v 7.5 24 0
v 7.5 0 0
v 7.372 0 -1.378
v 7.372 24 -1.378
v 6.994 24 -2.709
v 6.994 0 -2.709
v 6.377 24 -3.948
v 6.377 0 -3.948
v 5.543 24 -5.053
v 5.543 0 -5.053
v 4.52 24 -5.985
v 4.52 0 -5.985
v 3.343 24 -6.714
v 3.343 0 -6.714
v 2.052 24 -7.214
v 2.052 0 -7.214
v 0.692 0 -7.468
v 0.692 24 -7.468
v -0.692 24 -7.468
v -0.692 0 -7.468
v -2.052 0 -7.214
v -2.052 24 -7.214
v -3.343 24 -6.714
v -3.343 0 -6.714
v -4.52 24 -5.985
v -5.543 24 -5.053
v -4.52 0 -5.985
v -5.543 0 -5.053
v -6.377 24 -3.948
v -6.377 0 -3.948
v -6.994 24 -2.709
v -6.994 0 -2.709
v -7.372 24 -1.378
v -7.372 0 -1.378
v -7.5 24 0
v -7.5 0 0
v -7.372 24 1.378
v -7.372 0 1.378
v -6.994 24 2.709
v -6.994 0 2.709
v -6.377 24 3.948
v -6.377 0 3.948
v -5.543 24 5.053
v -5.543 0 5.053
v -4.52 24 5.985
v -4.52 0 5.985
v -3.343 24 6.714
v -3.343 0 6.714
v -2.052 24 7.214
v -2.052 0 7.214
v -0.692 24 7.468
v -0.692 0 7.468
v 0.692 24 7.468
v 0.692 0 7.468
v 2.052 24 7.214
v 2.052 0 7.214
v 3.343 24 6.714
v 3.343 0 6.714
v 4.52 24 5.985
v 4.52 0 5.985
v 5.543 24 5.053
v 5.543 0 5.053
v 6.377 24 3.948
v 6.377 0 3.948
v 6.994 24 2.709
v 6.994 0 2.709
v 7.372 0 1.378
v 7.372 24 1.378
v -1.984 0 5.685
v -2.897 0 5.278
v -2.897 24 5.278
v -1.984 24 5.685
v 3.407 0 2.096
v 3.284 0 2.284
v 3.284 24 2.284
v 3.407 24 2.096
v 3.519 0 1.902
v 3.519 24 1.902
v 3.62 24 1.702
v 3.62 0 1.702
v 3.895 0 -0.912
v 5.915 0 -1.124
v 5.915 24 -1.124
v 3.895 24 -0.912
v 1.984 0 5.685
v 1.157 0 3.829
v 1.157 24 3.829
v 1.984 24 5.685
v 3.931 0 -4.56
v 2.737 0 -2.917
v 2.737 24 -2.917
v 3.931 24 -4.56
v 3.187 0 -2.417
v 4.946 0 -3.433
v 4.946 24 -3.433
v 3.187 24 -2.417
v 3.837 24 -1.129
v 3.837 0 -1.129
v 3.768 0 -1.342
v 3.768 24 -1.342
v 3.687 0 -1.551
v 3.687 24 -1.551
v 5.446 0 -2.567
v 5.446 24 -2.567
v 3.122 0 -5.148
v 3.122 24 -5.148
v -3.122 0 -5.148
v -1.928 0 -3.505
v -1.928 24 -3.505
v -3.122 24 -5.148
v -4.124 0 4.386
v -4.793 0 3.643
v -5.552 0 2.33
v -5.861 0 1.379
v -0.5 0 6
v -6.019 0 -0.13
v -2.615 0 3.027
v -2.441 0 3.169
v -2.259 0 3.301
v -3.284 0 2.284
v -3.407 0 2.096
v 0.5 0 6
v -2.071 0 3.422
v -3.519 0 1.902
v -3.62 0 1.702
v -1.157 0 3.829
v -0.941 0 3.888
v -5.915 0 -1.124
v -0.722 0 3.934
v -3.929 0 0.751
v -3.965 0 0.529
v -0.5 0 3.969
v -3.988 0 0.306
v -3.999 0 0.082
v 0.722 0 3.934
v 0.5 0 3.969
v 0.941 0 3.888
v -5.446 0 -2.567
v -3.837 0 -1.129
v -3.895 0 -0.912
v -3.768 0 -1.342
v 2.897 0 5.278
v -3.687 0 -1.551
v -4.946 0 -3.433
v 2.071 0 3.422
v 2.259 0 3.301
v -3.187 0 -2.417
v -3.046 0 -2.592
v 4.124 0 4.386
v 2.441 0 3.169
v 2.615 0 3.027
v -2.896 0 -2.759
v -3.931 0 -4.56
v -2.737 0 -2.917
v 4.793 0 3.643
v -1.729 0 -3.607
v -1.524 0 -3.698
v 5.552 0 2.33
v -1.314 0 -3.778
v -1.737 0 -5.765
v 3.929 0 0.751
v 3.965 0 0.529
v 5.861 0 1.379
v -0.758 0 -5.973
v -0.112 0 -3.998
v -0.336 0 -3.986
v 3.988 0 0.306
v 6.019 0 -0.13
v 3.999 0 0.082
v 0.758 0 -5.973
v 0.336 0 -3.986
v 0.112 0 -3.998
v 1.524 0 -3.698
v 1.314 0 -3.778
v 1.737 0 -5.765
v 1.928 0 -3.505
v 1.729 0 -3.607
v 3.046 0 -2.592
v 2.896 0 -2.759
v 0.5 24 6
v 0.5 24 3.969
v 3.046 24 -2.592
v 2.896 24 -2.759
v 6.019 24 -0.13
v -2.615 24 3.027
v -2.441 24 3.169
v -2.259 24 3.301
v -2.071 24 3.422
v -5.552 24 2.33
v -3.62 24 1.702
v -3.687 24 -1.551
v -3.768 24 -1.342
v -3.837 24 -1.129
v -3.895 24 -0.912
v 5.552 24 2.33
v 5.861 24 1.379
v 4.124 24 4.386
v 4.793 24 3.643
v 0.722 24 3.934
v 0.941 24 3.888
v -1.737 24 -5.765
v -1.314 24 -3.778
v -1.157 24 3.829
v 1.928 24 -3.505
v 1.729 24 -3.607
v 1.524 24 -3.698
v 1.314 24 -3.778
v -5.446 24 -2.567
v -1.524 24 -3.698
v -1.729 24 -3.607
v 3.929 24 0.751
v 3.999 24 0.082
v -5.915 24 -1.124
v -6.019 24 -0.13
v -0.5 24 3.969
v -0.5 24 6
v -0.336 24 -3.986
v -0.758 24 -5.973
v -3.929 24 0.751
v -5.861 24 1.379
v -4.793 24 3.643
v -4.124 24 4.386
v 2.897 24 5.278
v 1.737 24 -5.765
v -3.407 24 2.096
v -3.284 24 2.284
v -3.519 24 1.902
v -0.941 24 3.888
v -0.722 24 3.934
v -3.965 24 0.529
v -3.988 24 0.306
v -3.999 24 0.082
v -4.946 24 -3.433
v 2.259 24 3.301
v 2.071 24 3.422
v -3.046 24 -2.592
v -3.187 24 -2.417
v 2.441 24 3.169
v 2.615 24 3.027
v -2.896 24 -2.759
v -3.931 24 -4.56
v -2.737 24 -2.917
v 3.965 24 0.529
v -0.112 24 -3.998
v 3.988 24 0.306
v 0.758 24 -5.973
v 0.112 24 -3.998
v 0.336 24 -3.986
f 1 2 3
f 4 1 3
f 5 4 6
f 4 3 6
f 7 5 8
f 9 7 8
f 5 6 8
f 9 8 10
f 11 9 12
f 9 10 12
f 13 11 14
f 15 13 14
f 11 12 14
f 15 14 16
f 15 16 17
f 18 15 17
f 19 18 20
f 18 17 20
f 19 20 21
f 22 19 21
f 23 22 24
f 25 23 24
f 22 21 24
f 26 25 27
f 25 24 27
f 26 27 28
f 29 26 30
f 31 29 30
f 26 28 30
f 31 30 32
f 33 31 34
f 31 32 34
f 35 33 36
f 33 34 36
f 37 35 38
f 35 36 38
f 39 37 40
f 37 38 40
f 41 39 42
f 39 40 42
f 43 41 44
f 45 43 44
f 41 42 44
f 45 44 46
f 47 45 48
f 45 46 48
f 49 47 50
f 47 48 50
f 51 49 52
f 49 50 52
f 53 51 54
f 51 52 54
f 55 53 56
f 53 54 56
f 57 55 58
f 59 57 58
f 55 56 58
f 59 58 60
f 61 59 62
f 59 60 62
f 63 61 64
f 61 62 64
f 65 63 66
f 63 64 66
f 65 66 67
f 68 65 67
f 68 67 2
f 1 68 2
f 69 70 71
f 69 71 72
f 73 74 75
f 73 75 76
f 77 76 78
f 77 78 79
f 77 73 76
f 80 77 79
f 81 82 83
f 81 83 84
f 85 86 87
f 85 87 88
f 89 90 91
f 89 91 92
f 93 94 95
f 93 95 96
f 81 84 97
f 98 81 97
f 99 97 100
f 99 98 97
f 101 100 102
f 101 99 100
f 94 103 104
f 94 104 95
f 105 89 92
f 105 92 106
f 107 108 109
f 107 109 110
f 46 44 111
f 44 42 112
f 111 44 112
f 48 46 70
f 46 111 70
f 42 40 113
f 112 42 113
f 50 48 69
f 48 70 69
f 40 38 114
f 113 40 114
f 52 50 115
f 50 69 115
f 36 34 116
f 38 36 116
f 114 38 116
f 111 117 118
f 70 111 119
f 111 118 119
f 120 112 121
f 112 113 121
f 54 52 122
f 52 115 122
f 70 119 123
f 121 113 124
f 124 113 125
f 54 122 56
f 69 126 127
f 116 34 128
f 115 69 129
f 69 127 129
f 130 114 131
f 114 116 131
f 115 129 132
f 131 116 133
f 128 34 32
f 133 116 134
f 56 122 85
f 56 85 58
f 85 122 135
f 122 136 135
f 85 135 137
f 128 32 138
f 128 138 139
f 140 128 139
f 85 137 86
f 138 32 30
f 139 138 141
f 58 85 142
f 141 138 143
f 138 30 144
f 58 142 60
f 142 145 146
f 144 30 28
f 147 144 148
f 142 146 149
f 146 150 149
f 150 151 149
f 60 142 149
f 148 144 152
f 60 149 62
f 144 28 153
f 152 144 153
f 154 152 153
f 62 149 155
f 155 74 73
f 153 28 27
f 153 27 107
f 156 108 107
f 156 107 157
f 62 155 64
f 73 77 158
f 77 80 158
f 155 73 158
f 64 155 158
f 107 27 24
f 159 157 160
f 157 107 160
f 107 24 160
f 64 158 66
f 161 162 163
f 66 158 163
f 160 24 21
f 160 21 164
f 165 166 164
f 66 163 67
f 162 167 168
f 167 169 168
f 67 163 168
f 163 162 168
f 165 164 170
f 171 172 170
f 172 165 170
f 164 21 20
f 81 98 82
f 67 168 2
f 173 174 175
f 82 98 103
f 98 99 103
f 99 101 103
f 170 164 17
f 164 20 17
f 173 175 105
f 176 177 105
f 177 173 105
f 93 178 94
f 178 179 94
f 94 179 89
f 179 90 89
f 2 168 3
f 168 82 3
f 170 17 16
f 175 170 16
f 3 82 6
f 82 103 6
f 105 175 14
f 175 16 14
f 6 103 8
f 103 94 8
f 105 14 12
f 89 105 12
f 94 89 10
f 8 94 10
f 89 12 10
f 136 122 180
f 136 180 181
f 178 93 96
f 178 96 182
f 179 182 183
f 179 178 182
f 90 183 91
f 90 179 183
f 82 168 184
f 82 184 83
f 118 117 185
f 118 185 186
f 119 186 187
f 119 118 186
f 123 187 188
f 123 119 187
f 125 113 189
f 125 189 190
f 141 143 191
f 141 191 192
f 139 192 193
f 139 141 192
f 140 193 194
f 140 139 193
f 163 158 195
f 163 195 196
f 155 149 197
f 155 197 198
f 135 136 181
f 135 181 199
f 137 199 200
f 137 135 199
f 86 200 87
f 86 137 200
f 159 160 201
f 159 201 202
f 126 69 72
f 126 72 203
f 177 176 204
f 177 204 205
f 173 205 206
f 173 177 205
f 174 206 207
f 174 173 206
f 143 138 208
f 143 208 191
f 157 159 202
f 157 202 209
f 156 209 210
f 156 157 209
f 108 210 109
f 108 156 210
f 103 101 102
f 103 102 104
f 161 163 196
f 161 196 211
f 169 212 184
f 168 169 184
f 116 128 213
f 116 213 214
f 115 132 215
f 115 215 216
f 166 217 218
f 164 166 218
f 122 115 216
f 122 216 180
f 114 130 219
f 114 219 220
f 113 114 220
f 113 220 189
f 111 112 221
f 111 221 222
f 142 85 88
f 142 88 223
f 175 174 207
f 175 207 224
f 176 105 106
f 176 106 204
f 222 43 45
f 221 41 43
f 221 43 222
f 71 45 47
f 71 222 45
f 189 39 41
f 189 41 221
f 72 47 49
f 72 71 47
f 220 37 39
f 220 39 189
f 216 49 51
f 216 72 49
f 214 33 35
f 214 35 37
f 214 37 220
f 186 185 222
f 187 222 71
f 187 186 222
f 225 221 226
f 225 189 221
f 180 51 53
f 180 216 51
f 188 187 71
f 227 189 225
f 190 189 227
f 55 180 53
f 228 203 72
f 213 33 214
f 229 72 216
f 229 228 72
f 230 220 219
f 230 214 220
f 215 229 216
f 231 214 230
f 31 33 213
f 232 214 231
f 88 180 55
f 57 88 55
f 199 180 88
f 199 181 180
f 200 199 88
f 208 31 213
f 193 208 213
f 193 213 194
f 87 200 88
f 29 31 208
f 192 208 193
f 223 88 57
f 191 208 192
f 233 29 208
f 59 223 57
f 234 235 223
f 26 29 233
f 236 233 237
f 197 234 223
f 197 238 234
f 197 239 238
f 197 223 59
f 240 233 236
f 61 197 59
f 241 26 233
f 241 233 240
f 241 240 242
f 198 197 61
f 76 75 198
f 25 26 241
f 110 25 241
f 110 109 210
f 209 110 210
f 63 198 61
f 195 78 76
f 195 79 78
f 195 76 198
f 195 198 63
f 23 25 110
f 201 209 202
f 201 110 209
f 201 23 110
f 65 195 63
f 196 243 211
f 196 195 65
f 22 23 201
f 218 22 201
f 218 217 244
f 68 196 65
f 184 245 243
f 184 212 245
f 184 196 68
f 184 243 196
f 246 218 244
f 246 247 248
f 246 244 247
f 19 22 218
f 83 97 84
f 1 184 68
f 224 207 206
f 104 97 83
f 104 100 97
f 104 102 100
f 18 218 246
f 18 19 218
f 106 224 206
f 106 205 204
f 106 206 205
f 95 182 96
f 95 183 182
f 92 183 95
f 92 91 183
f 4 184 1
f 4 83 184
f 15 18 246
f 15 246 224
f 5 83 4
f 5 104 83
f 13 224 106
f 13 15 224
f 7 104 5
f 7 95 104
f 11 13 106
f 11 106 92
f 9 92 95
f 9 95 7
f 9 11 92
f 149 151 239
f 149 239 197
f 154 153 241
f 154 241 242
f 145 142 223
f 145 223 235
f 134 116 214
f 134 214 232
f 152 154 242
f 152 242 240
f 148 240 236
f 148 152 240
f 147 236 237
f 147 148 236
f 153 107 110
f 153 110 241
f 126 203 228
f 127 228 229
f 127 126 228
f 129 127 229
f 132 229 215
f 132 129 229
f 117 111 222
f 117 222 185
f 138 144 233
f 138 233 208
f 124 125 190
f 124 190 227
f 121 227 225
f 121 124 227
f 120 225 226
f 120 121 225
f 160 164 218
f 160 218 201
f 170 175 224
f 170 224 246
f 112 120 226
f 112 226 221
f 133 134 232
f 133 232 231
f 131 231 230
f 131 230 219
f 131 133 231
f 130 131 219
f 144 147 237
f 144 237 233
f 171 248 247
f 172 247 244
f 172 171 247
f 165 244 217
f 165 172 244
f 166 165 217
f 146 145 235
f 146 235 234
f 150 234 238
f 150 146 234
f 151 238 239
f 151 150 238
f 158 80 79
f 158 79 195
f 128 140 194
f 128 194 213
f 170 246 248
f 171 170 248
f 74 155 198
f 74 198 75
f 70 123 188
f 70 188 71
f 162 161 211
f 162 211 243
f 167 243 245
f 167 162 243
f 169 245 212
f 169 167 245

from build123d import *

# Parameters (mm, degrees)
SKETCH1_R           = 7.5
BOSS_EXTRUDE1_DEPTH = 24


with BuildPart() as part:
    # Sketch1 → Boss-Extrude1 (new body)
    with BuildSketch(Plane(origin=(0, 0, 0), x_dir=(1, 0, 0), z_dir=(0, 1, 0))):
        Circle(SKETCH1_R)
        with BuildLine():
            Line((-0.5, -3.968626967), (-0.5, -6))
            Line((-0.5, -6), (0.5, -6))
            Line((0.5, -6), (0.5, -3.968626967))
            ThreePointArc((0.5, -3.968626967), (0.831646763, -3.912590403), (1.157413281, -3.82888946))
            Line((1.157413281, -3.82888946), (1.98364713, -5.684641067))
            Line((1.98364713, -5.684641067), (2.897192587, -5.277904424))
            Line((2.897192587, -5.277904424), (2.070958739, -3.422152817))
            ThreePointArc((2.070958739, -3.422152817), (2.351141009, -3.236067977), (2.614699291, -3.027102181))
            Line((2.614699291, -3.027102181), (4.12430365, -4.386356051))
            Line((4.12430365, -4.386356051), (4.793434256, -3.643211225))
            Line((4.793434256, -3.643211225), (3.283829898, -2.283957356))
            ThreePointArc((3.283829898, -2.283957356), (3.464101615, -2), (3.61988004, -1.701901435))
            Line((3.61988004, -1.701901435), (5.551830601, -2.329630224))
            Line((5.551830601, -2.329630224), (5.860847595, -1.378573708))
            Line((5.860847595, -1.378573708), (3.928897035, -0.750844919))
            ThreePointArc((3.928897035, -0.750844919), (3.978087581, -0.418113853), (3.999150644, -0.08242647))
            Line((3.999150644, -0.08242647), (6.019395604, 0.129909832))
            Line((6.019395604, 0.129909832), (5.914867141, 1.124431727))
            Line((5.914867141, 1.124431727), (3.894622181, 0.912095426))
            ThreePointArc((3.894622181, 0.912095426), (3.804226065, 1.236067977), (3.686931771, 1.551300781))
            Line((3.686931771, 1.551300781), (5.446152423, 2.566987298))
            Line((5.446152423, 2.566987298), (4.946152423, 3.433012702))
            Line((4.946152423, 3.433012702), (3.186931771, 2.417326185))
            ThreePointArc((3.186931771, 2.417326185), (2.972579302, 2.676522425), (2.7372089, 2.916794034))
            Line((2.7372089, 2.916794034), (3.931220011, 4.56020934))
            Line((3.931220011, 4.56020934), (3.122203017, 5.147994592))
            Line((3.122203017, 5.147994592), (1.928191906, 3.504579286))
            ThreePointArc((1.928191906, 3.504579286), (1.626946572, 3.654181831), (1.314197743, 3.7779471))
            Line((1.314197743, 3.7779471), (1.736543945, 5.764929759))
            Line((1.736543945, 5.764929759), (0.758396345, 5.97284145))
            Line((0.758396345, 5.97284145), (0.336050142, 3.985858791))
            ThreePointArc((0.336050142, 3.985858791), (0, 4), (-0.336050142, 3.985858791))
            Line((-0.336050142, 3.985858791), (-0.758396345, 5.97284145))
            Line((-0.758396345, 5.97284145), (-1.736543945, 5.764929759))
            Line((-1.736543945, 5.764929759), (-1.314197743, 3.7779471))
            ThreePointArc((-1.314197743, 3.7779471), (-1.626946572, 3.654181831), (-1.928191906, 3.504579286))
            Line((-1.928191906, 3.504579286), (-3.122203017, 5.147994592))
            Line((-3.122203017, 5.147994592), (-3.931220011, 4.56020934))
            Line((-3.931220011, 4.56020934), (-2.7372089, 2.916794034))
            ThreePointArc((-2.7372089, 2.916794034), (-2.972579302, 2.676522425), (-3.186931771, 2.417326185))
            Line((-3.186931771, 2.417326185), (-4.946152423, 3.433012702))
            Line((-4.946152423, 3.433012702), (-5.446152423, 2.566987298))
            Line((-5.446152423, 2.566987298), (-3.686931771, 1.551300781))
            ThreePointArc((-3.686931771, 1.551300781), (-3.804226065, 1.236067977), (-3.894622181, 0.912095426))
            Line((-3.894622181, 0.912095426), (-5.914867141, 1.124431727))
            Line((-5.914867141, 1.124431727), (-6.019395604, 0.129909832))
            Line((-6.019395604, 0.129909832), (-3.999150644, -0.08242647))
            ThreePointArc((-3.999150644, -0.08242647), (-3.978087581, -0.418113853), (-3.928897035, -0.750844919))
            Line((-3.928897035, -0.750844919), (-5.860847595, -1.378573708))
            Line((-5.860847595, -1.378573708), (-5.551830601, -2.329630224))
            Line((-5.551830601, -2.329630224), (-3.61988004, -1.701901435))
            ThreePointArc((-3.61988004, -1.701901435), (-3.464101615, -2), (-3.283829898, -2.283957356))
            Line((-3.283829898, -2.283957356), (-4.793434256, -3.643211225))
            Line((-4.793434256, -3.643211225), (-4.12430365, -4.386356051))
            Line((-4.12430365, -4.386356051), (-2.614699291, -3.027102181))
            ThreePointArc((-2.614699291, -3.027102181), (-2.351141009, -3.236067977), (-2.070958739, -3.422152817))
            Line((-2.070958739, -3.422152817), (-2.897192587, -5.277904424))
            Line((-2.897192587, -5.277904424), (-1.98364713, -5.684641067))
            Line((-1.98364713, -5.684641067), (-1.157413281, -3.82888946))
            ThreePointArc((-1.157413281, -3.82888946), (-0.831646763, -3.912590403), (-0.5, -3.968626967))
        make_face(mode=Mode.SUBTRACT)
    extrude(amount=BOSS_EXTRUDE1_DEPTH)


solid = part.part
